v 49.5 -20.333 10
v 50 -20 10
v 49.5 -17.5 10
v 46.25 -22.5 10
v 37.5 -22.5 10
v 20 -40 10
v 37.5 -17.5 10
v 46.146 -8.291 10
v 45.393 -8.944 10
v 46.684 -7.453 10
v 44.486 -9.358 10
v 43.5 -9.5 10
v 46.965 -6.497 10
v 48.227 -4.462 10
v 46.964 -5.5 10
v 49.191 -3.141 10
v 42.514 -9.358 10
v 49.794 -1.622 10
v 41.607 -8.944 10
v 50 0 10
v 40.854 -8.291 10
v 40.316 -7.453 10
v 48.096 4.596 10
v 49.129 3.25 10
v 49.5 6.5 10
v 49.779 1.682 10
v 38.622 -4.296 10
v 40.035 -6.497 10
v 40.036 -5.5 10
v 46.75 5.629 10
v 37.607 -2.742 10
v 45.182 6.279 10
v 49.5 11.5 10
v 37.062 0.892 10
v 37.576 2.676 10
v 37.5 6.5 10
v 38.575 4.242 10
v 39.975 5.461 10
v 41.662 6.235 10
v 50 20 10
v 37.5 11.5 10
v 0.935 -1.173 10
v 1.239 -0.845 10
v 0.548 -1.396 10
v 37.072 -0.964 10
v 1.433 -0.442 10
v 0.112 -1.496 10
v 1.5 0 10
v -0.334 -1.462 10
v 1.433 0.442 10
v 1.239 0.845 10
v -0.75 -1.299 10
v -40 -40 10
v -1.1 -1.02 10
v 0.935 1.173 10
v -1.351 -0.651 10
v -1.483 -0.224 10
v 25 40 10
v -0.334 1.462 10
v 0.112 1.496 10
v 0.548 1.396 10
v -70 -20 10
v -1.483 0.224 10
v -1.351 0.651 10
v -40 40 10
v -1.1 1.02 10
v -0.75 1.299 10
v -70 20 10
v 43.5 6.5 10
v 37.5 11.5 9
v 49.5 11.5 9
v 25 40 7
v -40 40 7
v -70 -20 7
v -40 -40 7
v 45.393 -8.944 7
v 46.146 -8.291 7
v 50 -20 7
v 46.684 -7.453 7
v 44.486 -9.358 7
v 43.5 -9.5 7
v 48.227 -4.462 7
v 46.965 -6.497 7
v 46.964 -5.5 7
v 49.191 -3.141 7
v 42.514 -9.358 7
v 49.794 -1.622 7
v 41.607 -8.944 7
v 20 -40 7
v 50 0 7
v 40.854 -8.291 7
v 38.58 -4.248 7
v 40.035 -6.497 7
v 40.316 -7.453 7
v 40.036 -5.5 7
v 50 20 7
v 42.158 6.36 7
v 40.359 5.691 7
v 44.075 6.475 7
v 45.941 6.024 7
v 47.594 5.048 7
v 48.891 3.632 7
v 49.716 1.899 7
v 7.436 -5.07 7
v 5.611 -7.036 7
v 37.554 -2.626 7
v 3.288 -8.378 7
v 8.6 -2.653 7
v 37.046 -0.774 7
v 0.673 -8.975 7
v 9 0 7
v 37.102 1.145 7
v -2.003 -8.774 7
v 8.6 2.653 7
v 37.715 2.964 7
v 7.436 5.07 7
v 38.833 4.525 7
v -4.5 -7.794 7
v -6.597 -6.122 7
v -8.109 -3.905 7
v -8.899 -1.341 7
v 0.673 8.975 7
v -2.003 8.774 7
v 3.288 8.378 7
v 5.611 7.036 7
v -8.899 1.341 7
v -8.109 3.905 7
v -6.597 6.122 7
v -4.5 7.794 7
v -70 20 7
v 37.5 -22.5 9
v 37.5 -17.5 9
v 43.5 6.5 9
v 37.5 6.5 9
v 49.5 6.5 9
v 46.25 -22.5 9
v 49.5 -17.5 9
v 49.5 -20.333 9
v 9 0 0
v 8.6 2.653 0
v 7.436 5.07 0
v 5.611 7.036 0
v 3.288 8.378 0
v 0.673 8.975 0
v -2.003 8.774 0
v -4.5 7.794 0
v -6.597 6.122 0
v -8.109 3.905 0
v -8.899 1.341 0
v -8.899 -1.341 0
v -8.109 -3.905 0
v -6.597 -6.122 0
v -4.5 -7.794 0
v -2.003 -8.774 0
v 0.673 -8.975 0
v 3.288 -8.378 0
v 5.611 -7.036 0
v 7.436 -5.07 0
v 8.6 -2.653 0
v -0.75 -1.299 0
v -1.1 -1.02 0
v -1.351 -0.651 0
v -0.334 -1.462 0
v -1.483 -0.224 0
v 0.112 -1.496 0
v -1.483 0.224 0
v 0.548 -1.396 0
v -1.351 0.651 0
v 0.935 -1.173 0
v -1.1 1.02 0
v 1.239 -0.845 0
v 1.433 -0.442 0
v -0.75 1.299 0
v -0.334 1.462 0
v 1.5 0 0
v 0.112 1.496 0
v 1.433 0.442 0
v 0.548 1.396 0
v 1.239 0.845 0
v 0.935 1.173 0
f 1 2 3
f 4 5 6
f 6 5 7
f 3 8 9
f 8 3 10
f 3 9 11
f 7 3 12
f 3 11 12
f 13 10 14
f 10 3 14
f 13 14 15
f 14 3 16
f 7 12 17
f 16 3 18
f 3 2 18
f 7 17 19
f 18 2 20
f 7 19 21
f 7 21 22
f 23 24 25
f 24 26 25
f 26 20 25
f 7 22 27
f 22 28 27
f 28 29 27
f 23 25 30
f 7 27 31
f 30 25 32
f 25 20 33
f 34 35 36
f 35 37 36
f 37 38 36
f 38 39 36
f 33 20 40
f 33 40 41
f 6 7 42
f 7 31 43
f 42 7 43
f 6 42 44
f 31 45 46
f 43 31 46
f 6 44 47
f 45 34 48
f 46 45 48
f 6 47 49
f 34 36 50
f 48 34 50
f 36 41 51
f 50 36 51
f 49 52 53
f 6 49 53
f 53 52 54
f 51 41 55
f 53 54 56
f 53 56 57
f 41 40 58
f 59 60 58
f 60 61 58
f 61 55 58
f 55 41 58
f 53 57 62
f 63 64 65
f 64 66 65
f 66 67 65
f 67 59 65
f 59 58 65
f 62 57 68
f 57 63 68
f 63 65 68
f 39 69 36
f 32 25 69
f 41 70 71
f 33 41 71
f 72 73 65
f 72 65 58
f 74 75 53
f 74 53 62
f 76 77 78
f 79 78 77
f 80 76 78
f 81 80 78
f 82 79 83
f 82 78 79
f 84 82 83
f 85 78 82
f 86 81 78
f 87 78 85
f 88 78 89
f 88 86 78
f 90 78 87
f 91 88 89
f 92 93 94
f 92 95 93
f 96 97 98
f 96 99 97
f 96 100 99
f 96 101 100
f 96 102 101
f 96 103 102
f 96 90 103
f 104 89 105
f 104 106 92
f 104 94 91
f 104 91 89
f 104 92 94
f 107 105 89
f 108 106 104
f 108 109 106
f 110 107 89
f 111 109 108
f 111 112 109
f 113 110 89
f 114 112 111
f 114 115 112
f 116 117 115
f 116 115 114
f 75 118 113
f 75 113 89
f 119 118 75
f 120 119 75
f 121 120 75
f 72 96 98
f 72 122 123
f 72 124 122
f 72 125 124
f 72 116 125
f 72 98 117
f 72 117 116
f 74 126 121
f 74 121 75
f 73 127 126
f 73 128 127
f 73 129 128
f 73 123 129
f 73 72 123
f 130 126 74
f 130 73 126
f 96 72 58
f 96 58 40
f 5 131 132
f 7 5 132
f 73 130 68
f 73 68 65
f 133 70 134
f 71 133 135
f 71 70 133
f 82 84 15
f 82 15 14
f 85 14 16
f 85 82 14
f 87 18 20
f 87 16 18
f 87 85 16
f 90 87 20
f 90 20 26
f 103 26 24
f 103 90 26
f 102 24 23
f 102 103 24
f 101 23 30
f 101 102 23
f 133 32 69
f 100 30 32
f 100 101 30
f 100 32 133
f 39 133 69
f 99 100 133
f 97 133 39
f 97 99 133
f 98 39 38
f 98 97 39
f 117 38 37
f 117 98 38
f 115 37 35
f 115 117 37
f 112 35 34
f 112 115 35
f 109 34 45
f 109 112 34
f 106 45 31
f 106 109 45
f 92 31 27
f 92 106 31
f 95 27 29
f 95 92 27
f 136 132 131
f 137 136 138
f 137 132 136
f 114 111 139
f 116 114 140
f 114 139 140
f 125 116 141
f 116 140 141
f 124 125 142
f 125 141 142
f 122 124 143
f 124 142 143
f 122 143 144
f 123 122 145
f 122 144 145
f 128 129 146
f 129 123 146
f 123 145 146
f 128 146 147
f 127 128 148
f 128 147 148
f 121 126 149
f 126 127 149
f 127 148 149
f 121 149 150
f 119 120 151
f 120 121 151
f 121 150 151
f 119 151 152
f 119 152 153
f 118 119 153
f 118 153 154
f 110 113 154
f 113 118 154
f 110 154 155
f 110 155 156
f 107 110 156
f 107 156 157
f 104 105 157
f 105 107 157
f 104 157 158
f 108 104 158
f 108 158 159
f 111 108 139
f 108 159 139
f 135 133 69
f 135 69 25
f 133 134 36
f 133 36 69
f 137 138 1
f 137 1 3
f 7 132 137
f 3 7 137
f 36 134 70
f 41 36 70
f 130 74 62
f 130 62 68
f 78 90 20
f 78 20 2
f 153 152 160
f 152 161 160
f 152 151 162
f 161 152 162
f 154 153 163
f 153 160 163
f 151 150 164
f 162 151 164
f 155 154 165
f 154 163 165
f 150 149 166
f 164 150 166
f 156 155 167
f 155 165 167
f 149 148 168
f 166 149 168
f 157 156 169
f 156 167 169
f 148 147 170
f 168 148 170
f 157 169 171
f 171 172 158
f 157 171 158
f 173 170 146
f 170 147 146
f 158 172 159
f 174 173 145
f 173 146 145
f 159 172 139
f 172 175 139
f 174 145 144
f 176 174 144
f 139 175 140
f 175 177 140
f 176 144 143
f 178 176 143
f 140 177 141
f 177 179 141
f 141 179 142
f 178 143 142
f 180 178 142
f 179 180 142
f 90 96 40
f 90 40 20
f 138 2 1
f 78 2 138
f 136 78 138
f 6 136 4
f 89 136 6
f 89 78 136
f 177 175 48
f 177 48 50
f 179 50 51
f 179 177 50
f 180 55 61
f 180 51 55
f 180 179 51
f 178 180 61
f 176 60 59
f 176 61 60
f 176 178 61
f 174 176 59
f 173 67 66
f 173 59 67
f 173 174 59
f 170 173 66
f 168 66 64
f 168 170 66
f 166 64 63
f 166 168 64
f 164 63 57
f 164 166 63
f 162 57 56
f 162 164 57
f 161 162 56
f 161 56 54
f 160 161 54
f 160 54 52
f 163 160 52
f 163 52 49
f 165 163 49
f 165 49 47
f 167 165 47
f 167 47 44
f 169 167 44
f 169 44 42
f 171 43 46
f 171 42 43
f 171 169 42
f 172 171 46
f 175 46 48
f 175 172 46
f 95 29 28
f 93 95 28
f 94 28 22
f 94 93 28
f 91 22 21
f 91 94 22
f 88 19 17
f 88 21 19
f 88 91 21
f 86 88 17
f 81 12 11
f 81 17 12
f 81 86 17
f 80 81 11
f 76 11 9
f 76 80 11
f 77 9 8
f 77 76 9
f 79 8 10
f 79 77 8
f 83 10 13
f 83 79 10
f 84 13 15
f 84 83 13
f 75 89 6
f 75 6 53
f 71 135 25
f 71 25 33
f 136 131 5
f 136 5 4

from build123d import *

# Parameters (mm, degrees)
BOX003_W          = 12
BOX003_H          = 5
BOX003_DEPTH      = 9
BOX002_W          = 12
BOX002_H          = 5
BOX002_DEPTH      = 9
CYLINDER007_R     = 3.5
CYLINDER007_DEPTH = 10
CYLINDER006_R     = 6.5
CYLINDER006_DEPTH = 10
BOX001_W          = 11
BOX001_H          = 4
BOX001_DEPTH      = 9
CYLINDER005_R     = 1.5
CYLINDER005_DEPTH = 20
PAD003_DEPTH      = 3
CYLINDER001_R     = 9
CYLINDER001_DEPTH = 9


with BuildPart() as cube003:
    # Box003 → Box003 (new body)
    with BuildSketch(Plane(origin=(37.5, -22.5, 9), x_dir=(1, 0, 0), z_dir=(0, 0, 1))):
        with Locations((6, 2.5)):
            Rectangle(BOX003_W, BOX003_H)
    extrude(amount=BOX003_DEPTH)


with BuildPart() as fusion006:
    # Box002 → Box002 (new body)
    with BuildSketch(Plane(origin=(37.5, 6.5, 9), x_dir=(1, 0, 0), z_dir=(0, 0, 1))):
        with Locations((6, 2.5)):
            Rectangle(BOX002_W, BOX002_H)
    extrude(amount=BOX002_DEPTH)

    # Fusion006: union Cube003
    add(cube003.part)


with BuildPart() as cylinder007:
    # Cylinder007 → Cylinder007 (new body)
    with BuildSketch(Plane(origin=(43.5, -6, 3), x_dir=(1, 0, 0), z_dir=(0, 0, 1))):
        Circle(CYLINDER007_R)
    extrude(amount=CYLINDER007_DEPTH)


with BuildPart() as fusion005:
    # Cylinder006 → Cylinder006 (new body)
    with BuildSketch(Plane(origin=(43.5, 0, 3), x_dir=(1, 0, 0), z_dir=(0, 0, 1))):
        Circle(CYLINDER006_R)
    extrude(amount=CYLINDER006_DEPTH)

    # Fusion005: union Cylinder007
    add(cylinder007.part)


with BuildPart() as cube001:
    # Box001 → Box001 (new body)
    with BuildSketch(Plane(origin=(38, 7, 9), x_dir=(1, 0, 0), z_dir=(0, 0, 1))):
        with Locations((5.5, 2)):
            Rectangle(BOX001_W, BOX001_H)
    extrude(amount=BOX001_DEPTH)


with BuildPart() as clone_of_cube001:
    # Clone001 base: copy of Cube001
    add(cube001.part)


with BuildPart() as clone_of_cube001_1:
    # Clone001 placement: moved
    add(clone_of_cube001.part.moved(Location((0, -29, 0))))


with BuildPart() as cylinder005:
    # Cylinder005 → Cylinder005 (new body)
    with BuildSketch(Plane.XY.offset(-4)):
        Circle(CYLINDER005_R)
    extrude(amount=CYLINDER005_DEPTH)


with BuildPart() as pad003:
    # Sketch003 → Pad003 (new body)
    with BuildSketch(Plane(origin=(-30, 0, 7), x_dir=(1, 0, 0), z_dir=(0, 0, 1))):
        Polygon((-40, 20), (-10, 40), (55, 40), (80, 20), (80, -20), (50, -40), (-10, -40), (-40, -20), align=None)
    extrude(amount=PAD003_DEPTH)


with BuildPart() as top_panel001:
    # Cylinder001 → Cylinder001 (new body)
    with BuildSketch(Plane.XY):
        Circle(CYLINDER001_R)
    extrude(amount=CYLINDER001_DEPTH)

    # Fusion003: union Pad003
    add(pad003.part)

    # Cut004: cut Cylinder005
    add(cylinder005.part, mode=Mode.SUBTRACT)

    # Fusion004: union Cube001, Clone of Cube001
    add(cube001.part)
    add(clone_of_cube001_1.part)

    # Cut005: cut Fusion005
    add(fusion005.part, mode=Mode.SUBTRACT)

    # Cut006: cut Fusion006
    add(fusion006.part, mode=Mode.SUBTRACT)


solid = top_panel001.part
